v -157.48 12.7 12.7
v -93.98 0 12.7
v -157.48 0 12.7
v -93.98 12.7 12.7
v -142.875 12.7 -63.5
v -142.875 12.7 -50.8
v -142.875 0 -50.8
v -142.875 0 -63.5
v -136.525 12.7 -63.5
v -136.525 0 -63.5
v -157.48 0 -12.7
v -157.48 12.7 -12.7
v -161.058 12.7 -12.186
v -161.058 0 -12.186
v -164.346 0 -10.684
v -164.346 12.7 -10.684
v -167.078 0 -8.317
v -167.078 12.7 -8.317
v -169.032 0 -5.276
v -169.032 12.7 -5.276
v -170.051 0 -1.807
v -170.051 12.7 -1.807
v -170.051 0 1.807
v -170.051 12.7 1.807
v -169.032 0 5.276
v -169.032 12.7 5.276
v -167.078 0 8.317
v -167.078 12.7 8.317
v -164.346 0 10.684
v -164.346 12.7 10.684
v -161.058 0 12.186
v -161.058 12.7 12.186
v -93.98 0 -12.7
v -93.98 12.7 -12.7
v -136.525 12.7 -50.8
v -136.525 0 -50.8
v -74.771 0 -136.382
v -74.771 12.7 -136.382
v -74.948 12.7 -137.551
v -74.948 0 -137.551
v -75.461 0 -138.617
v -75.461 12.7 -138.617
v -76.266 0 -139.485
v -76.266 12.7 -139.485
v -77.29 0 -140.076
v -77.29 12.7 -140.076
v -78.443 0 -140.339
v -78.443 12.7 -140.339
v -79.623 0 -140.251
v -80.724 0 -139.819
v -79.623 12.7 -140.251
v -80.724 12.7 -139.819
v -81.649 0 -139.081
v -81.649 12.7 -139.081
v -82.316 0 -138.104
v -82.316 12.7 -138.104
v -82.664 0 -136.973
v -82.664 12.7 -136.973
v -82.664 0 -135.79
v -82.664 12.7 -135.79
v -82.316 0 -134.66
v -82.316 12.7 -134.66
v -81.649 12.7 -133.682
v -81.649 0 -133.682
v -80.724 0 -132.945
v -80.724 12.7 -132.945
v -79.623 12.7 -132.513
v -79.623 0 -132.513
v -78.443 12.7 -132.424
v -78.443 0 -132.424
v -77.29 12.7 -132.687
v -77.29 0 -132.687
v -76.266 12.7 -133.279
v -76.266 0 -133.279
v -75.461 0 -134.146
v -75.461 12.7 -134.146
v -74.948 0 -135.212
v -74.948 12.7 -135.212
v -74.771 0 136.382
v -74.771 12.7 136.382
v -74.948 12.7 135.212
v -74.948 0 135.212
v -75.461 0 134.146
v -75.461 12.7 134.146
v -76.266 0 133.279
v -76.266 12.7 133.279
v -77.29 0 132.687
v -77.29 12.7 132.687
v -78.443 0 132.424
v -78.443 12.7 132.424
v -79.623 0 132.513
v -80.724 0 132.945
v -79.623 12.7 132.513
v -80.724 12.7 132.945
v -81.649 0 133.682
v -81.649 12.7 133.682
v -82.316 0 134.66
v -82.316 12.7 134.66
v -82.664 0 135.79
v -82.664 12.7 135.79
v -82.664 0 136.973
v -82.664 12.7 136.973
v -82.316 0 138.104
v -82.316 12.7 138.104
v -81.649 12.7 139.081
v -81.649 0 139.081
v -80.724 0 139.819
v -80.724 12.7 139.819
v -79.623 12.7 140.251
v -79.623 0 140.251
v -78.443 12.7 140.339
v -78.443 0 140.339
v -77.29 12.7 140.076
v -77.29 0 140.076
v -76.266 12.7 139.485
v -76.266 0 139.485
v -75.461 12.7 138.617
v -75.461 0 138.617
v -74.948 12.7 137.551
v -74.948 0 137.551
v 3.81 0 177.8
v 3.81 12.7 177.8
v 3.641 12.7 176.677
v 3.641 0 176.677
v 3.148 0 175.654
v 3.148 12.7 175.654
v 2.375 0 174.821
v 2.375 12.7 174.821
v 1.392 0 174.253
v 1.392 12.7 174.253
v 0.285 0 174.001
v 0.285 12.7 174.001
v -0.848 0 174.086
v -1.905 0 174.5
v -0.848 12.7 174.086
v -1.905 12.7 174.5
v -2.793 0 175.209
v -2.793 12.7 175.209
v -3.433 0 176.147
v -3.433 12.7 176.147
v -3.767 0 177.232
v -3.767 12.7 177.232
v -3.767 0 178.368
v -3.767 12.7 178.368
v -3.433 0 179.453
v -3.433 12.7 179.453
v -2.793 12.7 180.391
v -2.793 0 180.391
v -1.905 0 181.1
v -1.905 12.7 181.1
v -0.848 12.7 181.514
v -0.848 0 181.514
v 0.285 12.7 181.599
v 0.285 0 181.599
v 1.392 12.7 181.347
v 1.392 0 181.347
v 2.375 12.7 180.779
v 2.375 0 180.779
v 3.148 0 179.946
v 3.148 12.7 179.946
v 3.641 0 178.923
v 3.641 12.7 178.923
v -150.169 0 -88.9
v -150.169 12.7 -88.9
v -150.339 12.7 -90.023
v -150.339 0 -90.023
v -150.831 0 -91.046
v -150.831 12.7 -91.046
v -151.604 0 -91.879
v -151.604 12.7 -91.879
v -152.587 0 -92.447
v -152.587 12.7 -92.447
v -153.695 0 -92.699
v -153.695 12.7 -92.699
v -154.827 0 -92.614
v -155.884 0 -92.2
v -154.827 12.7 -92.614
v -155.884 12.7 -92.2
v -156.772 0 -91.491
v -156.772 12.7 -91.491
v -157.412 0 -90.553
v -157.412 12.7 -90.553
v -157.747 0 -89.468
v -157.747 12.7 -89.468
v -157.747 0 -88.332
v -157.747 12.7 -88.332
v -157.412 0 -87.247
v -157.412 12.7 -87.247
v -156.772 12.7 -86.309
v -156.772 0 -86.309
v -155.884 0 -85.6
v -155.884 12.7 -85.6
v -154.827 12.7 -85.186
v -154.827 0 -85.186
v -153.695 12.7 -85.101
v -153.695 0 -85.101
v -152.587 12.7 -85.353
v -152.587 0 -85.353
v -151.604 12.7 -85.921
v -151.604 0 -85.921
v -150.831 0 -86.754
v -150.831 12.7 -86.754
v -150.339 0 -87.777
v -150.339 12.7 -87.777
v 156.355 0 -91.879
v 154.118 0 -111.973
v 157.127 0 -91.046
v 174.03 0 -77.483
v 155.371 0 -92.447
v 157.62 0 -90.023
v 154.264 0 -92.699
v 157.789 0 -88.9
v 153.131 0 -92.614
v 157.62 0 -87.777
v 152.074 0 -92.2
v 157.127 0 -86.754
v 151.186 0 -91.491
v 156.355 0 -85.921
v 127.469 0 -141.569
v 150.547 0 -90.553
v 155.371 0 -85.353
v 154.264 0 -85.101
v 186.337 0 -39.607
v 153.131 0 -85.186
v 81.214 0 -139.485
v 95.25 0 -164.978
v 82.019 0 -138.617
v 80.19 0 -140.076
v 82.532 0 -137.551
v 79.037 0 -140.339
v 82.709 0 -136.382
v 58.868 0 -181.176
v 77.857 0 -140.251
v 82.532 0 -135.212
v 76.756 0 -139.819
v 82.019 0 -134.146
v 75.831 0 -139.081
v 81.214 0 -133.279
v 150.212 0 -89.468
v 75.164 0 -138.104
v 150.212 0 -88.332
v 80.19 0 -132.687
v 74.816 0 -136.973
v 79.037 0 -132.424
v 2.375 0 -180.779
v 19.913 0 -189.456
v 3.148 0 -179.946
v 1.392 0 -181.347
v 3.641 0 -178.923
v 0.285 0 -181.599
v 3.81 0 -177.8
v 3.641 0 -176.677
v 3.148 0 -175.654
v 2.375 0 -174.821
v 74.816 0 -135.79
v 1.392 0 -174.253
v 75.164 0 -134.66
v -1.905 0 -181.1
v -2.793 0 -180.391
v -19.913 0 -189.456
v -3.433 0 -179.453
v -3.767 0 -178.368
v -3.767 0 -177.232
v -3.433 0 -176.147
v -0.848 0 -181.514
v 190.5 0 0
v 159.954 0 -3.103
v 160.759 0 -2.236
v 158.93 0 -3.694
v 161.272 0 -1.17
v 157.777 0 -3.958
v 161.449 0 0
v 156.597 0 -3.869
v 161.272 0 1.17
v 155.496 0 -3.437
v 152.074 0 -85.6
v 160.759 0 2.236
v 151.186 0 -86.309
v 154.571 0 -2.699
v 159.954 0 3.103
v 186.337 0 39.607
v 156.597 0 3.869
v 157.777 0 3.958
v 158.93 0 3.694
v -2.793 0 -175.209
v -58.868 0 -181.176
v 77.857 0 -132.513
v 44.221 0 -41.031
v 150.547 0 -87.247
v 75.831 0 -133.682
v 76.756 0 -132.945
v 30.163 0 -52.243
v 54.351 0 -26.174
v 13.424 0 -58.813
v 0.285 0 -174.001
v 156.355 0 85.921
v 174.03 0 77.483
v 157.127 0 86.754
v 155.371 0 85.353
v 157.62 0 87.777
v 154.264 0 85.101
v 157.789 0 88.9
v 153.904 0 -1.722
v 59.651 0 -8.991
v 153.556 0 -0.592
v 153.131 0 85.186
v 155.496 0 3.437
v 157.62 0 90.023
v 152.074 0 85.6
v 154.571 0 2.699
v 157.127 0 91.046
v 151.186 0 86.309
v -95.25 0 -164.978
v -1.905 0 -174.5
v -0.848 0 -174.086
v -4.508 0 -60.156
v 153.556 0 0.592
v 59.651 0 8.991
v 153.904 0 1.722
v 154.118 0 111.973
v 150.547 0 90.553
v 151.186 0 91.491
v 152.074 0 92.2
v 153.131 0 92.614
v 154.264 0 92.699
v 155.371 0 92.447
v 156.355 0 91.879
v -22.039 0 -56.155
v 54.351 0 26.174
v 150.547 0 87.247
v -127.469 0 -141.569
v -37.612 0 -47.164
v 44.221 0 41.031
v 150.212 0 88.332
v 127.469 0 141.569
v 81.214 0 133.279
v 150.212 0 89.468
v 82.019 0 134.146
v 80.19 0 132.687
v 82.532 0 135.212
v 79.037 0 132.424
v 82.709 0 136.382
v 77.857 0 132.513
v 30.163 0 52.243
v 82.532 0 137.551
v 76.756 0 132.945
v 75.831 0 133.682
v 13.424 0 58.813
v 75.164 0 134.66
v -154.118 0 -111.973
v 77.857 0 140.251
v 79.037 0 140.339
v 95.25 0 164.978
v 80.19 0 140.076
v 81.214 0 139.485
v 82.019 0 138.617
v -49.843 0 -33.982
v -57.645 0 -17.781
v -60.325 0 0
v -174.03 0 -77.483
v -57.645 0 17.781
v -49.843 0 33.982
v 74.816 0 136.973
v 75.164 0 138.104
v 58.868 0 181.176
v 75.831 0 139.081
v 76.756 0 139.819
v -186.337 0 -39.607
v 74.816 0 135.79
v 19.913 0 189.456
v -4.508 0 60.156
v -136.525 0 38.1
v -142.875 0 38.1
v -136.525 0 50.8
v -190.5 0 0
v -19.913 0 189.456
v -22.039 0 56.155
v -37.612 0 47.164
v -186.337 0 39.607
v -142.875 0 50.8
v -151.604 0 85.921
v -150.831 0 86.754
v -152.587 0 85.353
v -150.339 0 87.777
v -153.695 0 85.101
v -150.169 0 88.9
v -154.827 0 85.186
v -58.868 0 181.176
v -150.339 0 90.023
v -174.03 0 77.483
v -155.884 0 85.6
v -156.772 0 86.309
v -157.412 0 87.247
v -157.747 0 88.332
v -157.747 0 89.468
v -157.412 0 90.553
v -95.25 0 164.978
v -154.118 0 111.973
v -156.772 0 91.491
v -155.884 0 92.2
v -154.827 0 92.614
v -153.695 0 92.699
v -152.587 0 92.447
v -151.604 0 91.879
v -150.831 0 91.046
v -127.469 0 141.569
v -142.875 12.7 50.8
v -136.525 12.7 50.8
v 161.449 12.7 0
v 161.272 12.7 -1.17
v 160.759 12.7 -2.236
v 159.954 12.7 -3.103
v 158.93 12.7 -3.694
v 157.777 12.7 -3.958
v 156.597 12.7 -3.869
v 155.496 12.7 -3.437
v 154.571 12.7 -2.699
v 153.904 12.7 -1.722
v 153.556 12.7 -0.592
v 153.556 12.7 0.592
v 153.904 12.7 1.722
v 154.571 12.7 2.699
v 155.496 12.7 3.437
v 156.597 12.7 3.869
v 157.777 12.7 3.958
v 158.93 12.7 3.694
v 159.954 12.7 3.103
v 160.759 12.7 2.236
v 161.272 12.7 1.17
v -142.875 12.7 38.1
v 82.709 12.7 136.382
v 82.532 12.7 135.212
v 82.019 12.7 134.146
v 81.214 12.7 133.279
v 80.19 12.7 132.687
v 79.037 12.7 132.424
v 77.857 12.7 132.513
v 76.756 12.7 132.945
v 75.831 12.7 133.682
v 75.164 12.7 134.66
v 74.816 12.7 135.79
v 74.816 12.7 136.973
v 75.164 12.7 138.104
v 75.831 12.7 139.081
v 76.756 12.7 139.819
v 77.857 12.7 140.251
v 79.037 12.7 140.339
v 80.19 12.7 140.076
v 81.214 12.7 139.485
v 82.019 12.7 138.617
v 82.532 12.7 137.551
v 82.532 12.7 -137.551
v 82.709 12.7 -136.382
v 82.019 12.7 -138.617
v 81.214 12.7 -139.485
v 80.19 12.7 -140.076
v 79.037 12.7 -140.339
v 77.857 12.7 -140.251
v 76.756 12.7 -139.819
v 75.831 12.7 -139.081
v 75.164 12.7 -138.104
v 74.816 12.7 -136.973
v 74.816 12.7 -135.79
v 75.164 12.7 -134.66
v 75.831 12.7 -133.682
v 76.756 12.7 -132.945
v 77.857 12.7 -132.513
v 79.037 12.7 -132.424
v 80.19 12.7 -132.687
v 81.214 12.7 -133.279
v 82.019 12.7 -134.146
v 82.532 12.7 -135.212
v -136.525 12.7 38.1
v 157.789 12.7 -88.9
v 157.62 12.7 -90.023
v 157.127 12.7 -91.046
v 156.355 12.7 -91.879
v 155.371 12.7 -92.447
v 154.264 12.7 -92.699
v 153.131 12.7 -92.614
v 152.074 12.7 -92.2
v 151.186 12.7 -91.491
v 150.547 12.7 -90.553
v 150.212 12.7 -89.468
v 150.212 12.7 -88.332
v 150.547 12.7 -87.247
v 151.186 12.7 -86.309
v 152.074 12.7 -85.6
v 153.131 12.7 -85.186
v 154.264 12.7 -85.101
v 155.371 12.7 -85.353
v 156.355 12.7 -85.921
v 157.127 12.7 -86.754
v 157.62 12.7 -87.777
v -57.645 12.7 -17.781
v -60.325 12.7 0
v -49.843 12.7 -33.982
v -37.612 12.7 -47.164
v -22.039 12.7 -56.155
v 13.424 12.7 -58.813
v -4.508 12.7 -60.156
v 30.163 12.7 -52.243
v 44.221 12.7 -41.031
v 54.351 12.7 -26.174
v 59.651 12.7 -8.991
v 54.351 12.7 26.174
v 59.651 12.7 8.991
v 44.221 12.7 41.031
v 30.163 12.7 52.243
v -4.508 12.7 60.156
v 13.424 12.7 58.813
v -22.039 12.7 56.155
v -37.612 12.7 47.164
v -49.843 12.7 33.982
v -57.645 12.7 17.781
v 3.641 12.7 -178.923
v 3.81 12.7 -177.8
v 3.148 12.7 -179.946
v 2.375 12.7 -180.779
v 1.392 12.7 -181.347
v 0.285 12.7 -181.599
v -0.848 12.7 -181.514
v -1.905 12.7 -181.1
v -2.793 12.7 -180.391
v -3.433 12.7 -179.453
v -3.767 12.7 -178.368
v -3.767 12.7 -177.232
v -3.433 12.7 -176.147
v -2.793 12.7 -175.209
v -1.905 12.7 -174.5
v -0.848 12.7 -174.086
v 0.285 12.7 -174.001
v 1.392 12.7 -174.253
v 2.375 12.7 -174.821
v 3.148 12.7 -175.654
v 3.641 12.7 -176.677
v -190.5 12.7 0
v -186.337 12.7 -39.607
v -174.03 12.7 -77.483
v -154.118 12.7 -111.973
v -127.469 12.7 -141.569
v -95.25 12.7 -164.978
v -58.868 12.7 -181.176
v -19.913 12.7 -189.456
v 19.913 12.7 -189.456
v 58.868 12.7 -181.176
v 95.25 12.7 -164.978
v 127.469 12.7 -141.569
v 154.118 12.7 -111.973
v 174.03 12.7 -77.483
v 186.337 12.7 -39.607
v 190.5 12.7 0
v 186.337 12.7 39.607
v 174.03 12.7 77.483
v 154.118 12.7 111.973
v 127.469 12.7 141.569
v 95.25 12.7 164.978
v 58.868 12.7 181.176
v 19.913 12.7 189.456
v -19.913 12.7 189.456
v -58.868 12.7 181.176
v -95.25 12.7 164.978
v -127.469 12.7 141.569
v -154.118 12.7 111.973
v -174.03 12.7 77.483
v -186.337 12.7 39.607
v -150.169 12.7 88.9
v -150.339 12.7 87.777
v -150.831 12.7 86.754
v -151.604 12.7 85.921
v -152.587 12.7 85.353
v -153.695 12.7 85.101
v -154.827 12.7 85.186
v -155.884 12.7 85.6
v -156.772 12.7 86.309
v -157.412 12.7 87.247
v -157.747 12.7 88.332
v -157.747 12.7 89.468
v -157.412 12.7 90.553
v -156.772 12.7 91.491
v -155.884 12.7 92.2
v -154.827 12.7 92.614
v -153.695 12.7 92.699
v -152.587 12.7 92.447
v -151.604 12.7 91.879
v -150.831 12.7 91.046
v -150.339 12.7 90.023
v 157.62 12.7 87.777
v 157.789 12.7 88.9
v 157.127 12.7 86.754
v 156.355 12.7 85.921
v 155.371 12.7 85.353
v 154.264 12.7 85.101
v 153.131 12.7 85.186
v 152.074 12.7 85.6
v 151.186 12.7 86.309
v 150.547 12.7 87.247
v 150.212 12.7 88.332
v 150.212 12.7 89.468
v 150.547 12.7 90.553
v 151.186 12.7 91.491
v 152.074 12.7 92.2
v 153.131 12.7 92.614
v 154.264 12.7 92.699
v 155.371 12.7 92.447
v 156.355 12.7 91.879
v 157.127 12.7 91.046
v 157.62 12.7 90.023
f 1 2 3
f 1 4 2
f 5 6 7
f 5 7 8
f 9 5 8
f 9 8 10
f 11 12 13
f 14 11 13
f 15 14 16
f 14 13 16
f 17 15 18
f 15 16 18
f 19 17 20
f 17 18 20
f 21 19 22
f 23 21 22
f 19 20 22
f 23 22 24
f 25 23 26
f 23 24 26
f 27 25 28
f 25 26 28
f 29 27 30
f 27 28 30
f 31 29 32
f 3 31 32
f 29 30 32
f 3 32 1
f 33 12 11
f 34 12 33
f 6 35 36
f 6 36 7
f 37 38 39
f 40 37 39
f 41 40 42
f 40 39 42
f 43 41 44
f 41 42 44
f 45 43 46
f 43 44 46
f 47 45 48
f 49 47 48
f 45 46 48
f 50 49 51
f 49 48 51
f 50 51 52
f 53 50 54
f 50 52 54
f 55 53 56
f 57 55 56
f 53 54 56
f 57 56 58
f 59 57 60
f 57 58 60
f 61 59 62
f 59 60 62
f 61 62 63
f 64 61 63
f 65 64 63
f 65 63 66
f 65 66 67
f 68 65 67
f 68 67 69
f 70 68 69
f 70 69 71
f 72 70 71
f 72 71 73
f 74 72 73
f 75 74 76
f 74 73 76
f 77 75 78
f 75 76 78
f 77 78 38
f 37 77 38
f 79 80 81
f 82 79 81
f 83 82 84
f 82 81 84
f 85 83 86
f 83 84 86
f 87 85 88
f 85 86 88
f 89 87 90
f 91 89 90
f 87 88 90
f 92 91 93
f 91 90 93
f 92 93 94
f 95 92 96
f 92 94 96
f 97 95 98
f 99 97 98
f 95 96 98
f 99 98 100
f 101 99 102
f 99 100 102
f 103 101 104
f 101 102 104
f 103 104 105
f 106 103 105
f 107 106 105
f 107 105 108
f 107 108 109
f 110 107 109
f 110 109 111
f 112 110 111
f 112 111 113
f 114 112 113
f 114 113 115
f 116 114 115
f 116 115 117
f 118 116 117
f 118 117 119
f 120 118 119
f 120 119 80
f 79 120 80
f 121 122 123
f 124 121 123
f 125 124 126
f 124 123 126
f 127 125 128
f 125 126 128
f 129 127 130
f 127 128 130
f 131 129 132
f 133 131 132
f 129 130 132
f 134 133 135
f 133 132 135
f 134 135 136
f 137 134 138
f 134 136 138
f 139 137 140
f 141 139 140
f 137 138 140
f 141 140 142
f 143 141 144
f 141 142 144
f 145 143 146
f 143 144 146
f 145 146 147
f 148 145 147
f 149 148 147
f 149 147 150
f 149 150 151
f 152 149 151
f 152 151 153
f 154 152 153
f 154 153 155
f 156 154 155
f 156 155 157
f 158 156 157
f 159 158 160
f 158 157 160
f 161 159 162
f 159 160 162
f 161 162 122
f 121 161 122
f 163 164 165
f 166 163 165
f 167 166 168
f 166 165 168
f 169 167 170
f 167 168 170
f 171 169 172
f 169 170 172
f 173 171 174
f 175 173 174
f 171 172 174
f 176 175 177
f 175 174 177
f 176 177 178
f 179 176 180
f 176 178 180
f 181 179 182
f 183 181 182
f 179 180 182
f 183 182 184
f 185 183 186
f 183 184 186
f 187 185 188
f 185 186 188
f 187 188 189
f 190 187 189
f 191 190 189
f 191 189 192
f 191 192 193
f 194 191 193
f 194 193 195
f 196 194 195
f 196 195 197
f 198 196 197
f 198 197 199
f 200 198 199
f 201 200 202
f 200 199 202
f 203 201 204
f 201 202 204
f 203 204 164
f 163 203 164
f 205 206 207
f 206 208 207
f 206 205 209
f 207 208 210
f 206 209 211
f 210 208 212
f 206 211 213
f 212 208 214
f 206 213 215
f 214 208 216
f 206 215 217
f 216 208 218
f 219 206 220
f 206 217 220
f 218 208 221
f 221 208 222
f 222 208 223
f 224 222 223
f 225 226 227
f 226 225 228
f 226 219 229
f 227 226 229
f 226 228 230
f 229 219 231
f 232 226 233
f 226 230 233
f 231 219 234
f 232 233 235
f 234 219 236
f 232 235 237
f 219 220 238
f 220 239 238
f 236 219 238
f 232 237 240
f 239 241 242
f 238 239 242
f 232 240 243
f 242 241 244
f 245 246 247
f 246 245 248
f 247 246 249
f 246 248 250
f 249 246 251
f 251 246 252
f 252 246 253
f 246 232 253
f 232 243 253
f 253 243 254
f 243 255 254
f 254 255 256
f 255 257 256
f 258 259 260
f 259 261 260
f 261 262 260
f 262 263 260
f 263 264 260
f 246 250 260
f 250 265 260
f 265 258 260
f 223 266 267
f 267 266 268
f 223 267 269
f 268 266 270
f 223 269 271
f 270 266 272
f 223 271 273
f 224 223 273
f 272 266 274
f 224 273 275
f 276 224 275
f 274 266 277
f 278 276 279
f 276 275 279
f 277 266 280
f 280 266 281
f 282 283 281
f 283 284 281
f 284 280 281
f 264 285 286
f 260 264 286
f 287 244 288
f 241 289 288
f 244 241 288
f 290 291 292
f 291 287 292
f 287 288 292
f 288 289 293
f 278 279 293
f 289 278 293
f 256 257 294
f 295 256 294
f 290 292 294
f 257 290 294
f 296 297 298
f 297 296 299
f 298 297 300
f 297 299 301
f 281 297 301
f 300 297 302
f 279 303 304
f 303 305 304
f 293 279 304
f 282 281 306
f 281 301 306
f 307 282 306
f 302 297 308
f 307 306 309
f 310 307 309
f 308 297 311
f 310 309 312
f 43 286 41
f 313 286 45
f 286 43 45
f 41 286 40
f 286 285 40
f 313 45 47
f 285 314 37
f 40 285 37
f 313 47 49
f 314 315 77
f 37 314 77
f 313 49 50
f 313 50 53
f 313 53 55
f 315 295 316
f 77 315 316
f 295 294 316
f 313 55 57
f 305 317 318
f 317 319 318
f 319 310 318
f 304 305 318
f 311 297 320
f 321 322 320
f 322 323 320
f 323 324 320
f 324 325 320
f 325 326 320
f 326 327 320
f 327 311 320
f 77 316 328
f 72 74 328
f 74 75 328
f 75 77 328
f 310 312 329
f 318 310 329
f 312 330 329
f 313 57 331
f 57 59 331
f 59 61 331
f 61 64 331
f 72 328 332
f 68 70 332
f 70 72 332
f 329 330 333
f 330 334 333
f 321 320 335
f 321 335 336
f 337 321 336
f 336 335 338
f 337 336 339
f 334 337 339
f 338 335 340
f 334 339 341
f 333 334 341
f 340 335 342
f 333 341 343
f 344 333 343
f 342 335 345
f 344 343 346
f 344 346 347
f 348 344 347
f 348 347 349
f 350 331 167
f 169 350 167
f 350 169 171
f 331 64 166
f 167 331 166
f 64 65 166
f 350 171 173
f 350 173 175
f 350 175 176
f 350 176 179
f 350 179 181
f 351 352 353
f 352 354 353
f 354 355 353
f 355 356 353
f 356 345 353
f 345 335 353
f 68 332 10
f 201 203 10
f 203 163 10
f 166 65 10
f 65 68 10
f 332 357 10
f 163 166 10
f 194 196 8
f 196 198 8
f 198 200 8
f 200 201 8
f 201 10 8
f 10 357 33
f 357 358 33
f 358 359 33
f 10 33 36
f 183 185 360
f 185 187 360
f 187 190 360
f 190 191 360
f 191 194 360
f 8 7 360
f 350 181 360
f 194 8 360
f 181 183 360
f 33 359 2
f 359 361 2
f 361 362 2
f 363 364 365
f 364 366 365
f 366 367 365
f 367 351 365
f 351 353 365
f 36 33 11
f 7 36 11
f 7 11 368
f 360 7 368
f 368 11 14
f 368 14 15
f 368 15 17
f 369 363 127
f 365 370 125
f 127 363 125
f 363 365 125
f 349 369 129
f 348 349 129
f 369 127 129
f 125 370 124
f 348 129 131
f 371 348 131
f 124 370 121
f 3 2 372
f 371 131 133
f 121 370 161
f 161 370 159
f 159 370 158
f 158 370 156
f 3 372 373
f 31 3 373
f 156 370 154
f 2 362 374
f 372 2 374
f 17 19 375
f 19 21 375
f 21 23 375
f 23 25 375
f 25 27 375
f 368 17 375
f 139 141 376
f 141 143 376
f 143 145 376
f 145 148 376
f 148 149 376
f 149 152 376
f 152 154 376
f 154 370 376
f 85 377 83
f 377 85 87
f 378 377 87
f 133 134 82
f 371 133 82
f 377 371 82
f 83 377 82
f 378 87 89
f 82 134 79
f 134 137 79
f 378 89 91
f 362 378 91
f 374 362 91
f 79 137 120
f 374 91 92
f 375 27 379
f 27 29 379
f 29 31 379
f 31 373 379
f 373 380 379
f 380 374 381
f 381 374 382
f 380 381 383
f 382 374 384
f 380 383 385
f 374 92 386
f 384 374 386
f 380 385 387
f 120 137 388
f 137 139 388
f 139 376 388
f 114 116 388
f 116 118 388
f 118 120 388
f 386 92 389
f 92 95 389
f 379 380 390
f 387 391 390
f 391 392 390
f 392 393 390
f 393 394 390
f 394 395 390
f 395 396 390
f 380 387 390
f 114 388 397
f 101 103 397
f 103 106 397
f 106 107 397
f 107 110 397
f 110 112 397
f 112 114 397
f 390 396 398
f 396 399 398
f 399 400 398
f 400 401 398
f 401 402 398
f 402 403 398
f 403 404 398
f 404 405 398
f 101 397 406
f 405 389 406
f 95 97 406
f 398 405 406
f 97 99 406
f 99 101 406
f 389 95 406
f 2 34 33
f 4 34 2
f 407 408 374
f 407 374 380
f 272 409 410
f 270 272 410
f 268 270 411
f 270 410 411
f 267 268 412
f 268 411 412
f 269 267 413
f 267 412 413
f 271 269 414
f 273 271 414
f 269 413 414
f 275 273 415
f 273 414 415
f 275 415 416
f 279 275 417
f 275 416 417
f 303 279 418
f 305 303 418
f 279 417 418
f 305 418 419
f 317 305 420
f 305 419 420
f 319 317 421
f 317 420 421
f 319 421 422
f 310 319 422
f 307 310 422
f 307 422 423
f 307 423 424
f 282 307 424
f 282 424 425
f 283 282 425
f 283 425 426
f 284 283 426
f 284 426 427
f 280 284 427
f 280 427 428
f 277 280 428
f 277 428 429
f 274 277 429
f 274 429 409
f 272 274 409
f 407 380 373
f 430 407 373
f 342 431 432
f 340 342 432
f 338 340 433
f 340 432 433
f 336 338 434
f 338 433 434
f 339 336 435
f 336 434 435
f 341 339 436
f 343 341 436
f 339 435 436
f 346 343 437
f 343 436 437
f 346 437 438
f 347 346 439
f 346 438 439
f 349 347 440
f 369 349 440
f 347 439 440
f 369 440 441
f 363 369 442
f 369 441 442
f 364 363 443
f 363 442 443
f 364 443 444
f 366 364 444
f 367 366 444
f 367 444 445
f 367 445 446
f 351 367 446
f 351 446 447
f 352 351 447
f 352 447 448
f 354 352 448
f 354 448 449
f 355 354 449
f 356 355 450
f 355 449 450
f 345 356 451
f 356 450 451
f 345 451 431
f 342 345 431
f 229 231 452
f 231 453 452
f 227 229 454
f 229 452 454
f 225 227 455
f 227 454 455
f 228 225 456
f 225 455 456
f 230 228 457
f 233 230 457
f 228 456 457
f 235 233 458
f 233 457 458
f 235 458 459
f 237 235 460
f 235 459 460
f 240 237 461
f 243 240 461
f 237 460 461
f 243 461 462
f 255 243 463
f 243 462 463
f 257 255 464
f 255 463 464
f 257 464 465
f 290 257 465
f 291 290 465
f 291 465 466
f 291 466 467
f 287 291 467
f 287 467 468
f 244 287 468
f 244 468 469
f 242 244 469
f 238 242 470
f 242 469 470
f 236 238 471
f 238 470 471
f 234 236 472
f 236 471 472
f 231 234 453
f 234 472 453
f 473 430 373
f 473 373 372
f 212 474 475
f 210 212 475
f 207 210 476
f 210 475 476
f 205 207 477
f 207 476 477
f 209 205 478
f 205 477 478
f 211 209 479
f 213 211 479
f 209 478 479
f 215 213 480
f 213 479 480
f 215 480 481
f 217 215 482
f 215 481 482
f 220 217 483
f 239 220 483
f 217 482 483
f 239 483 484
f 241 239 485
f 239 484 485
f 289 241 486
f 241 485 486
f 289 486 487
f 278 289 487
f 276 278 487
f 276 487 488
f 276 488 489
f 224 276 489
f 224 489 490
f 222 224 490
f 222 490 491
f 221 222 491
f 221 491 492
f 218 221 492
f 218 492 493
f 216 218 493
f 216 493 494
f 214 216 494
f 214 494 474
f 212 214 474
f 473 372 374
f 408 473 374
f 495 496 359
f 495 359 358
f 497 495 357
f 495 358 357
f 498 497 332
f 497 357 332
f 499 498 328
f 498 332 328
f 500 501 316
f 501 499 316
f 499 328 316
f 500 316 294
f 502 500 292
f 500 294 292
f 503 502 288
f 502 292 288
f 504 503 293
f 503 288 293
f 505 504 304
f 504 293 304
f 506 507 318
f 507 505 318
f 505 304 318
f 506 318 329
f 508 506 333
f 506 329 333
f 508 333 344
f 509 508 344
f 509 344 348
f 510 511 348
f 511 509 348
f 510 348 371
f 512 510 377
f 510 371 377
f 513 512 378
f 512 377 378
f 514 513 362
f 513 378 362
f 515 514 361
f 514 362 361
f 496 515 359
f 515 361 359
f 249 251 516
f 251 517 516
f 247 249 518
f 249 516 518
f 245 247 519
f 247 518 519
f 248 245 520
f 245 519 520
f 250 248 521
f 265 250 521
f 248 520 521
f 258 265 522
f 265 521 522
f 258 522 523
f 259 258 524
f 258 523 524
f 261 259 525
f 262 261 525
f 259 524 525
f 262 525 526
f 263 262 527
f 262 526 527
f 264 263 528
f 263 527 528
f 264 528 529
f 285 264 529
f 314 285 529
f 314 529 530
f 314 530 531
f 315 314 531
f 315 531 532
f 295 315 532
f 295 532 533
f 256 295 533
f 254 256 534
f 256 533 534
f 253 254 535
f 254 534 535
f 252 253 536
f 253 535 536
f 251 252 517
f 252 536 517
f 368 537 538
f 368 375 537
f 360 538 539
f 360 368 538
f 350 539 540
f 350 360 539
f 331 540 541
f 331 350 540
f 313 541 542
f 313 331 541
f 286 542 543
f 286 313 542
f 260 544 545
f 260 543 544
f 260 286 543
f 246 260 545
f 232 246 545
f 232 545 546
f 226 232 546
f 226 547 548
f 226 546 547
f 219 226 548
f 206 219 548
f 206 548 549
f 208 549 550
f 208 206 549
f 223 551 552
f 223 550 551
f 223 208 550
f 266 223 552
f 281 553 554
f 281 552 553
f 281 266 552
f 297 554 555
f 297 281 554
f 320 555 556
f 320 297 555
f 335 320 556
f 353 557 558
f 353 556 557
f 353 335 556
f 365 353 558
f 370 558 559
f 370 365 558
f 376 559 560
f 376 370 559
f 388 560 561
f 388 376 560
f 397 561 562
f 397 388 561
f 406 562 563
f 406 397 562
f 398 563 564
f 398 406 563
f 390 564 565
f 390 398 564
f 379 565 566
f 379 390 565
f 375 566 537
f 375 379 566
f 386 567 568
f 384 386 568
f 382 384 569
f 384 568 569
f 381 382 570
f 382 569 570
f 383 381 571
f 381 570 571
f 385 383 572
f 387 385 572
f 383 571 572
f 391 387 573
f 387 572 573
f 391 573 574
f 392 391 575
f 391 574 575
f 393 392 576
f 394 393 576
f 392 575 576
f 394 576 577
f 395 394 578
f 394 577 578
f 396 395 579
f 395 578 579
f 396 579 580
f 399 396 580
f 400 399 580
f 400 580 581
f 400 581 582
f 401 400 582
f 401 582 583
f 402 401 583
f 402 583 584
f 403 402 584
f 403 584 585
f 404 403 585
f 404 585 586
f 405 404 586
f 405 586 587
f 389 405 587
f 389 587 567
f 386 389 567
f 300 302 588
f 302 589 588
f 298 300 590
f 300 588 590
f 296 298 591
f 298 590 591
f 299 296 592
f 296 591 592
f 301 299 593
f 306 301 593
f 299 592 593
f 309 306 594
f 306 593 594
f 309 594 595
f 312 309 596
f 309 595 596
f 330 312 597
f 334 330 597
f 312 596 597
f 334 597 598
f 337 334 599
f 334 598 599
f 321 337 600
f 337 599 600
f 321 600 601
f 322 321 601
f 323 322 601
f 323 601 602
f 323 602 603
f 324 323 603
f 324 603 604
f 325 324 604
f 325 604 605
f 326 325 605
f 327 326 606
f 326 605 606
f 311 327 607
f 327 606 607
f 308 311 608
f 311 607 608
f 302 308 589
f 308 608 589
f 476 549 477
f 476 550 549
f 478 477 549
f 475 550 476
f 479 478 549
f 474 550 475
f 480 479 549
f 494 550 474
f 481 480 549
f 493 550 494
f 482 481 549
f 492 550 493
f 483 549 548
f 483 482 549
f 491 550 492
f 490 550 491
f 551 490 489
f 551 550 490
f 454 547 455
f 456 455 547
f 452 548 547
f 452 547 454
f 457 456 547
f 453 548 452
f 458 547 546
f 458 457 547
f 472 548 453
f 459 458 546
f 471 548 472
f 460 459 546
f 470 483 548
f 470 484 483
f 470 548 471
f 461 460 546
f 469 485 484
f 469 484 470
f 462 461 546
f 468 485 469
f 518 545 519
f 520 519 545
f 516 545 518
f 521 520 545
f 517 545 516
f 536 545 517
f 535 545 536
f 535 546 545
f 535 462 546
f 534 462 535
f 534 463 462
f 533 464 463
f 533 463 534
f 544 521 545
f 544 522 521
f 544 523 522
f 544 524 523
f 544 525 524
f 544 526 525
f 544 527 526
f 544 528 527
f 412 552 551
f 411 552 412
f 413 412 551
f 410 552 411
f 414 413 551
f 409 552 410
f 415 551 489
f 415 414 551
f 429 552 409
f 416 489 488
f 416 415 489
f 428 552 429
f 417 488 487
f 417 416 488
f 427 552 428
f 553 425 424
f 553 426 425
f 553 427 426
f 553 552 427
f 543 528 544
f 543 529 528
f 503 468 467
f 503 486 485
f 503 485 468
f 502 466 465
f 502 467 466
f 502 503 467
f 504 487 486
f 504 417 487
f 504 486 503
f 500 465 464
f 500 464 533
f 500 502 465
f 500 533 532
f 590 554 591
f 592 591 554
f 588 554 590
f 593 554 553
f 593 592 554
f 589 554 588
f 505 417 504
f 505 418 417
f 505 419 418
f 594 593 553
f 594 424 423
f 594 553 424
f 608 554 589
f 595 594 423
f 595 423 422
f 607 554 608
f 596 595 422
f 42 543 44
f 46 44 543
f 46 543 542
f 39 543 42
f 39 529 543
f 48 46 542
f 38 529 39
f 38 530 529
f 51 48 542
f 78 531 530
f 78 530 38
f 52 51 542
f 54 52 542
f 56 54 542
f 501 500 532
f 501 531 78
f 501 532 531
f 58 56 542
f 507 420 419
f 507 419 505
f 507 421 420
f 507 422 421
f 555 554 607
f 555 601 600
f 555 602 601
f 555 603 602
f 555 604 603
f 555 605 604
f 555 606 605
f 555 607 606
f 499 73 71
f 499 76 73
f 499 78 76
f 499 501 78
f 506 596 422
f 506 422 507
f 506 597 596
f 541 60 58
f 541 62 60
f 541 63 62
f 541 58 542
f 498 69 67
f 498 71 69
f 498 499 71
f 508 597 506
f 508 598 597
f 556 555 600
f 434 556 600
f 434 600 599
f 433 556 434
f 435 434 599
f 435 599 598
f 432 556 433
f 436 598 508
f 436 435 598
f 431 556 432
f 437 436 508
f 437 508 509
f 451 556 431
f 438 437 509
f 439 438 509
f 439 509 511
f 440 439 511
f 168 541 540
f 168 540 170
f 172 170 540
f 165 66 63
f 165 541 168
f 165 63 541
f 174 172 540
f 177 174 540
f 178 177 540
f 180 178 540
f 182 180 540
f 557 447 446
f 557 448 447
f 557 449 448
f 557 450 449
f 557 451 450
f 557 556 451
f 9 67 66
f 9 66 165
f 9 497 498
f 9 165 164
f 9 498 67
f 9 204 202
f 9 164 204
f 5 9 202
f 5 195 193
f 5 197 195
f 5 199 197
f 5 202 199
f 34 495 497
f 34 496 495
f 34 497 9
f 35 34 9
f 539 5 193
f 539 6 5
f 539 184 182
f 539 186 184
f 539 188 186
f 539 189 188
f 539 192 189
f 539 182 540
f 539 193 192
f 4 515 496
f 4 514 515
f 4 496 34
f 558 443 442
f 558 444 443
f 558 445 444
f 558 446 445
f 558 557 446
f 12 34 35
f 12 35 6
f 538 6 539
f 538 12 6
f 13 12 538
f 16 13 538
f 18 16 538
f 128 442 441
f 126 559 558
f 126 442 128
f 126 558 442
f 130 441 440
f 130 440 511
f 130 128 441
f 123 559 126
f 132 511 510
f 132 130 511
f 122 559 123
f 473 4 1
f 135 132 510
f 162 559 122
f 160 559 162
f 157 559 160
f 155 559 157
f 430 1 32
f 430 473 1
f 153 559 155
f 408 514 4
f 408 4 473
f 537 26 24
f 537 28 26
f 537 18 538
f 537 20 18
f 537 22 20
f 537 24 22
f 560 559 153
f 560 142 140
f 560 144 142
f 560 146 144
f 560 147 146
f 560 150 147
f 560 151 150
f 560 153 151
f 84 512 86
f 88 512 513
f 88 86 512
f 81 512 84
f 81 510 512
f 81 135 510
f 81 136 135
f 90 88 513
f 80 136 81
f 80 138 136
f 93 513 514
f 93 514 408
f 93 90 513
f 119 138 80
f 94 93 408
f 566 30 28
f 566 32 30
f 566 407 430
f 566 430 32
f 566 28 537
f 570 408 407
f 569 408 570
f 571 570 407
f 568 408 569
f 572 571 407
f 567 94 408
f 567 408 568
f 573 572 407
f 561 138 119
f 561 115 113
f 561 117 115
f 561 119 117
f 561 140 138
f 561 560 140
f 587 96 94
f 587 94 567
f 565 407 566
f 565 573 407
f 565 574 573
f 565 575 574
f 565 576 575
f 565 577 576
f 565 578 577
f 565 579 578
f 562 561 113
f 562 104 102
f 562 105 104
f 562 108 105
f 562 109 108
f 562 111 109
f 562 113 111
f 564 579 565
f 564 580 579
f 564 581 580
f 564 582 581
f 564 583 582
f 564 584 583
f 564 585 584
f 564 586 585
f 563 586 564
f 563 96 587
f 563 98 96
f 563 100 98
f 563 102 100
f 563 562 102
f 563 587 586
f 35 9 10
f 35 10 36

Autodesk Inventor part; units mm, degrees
ref_plane "YZ Plane" through (0, 0, 0) normal (1, 0, 0) x (0, 1, 0)
ref_plane "XZ Plane" through (0, 0, 0) normal (0, 1, 0) x (-1, 0, 0)
ref_plane "XY Plane" through (0, 0, 0) normal (0, 0, 1) x (1, 0, 0)
sketch "Sketch1" plane through (0, 0, 0) normal (0, 1, 0) x (-1, 0, 0)
  circle A0 centre (0, 0) radius 190.5
  circle A1 centre (0, 0) radius 60.325
  dimension "d0" = 381
  dimension "d1" = 120.65
extrude "Extrusion1" add sketch "Sketch1" along normal blind 12.7
sketch "Sketch2" plane through (0, 12.7, 0) normal (0, 1, 0) x (1, 0, 0)
  line L0 (-142.875, 63.5) -> (-136.525, 63.5)
  line L1 (-136.525, 63.5) -> (-136.525, 50.8)
  line L2 (-136.525, 50.8) -> (-142.875, 50.8)
  line L3 (-142.875, 50.8) -> (-142.875, 63.5)
  line L4 (-136.525, 50.8) -> (-136.525, -50.8) construction
  line L5 (-111.125, 50.8) -> (-212.725, 50.8) construction
  line L6 (-136.525, -50.8) -> (-142.875, -50.8)
  line L7 (-142.875, -50.8) -> (-142.875, -38.1)
  line L8 (-142.875, -38.1) -> (-136.525, -38.1)
  line L9 (-136.525, -38.1) -> (-136.525, -50.8)
  line L10 (-136.525, 0) -> (-60.325, 0) construction
  line L11 (-136.525, 0) -> (-60.325, 0) construction
  circle A0 centre (0, 0) radius 85.725 construction
  line L12 (0, 0) -> (-85.725, 0) construction
  dimension "d4" = 6.35
  dimension "d5" = 12.7
  dimension "d6" = 101.6
  dimension "d7" = 90
  dimension "d8" = 6.35
  dimension "d9" = 12.7
  dimension "d10" = 76.2
  dimension "d11" = 0
extrude "Extrusion2" cut sketch "Sketch2" against normal through all
sketch "Sketch3" plane through (0, 12.7, 0) normal (0, 1, 0) x (1, 0, 0)
  circle A0 centre (0, 0) radius 157.48 construction
  circle A1 centre (-157.48, 0) radius 3.9687
  circle A2 centre (-78.74, -136.3817) radius 3.9687
  circle A3 centre (78.74, -136.3817) radius 3.9687
  circle A4 centre (157.48, 0) radius 3.9687
  circle A5 centre (78.74, 136.3817) radius 3.9687
  circle A6 centre (-78.74, 136.3817) radius 3.9687
  dimension "d16" = 314.96
  dimension "d17" = 7.9375
  dimension "d18" = 360
extrude "Extrusion3" cut sketch "Sketch3" against normal through all
sketch "Sketch4" plane through (0, 12.7, 0) normal (0, 1, 0) x (1, 0, 0)
  line L0 (0, 0) -> (0, -177.8) construction
  line L1 (0, 0) -> (177.8, 0) construction
  circle A0 centre (0, -177.8) radius 3.81
  circle A1 centre (153.9793, -88.9) radius 3.81
  circle A2 centre (153.9793, 88.9) radius 3.81
  circle A3 centre (0, 177.8) radius 3.81
  circle A4 centre (-153.9793, 88.9) radius 3.81
  circle A5 centre (-153.9793, -88.9) radius 3.81
  dimension "d21" = 177.8
  dimension "d22" = 90
  dimension "d23" = 7.62
  dimension "d26" = 360
extrude "Extrusion4" cut sketch "Sketch4" against normal through all
sketch "Sketch5" plane through (0, 12.7, 0) normal (0, 1, 0) x (1, 0, 0)
  circle A0 centre (-157.48, 0) radius 3.9687 projected
  circle A1 centre (-157.48, 0) radius 12.7
  point P0 (0, 0)
  dimension "d30" = 25.4
extrude "Extrusion5" cut sketch "Sketch5" against normal through all
sketch "Sketch6" plane through (0, 12.7, 0) normal (0, 1, 0) x (1, 0, 0)
  circle A0 centre (-157.48, 0) radius 12.7 projected
  line L0 (-157.48, 12.7) -> (-93.98, 12.7)
  line L1 (-93.98, 12.7) -> (-93.98, -12.7)
  line L2 (-93.98, -12.7) -> (-157.48, -12.7)
  line L3 (-157.48, -12.7) -> (-157.48, 12.7)
  point P0 (0, 0)
  dimension "d33" = 63.5
extrude "Extrusion6" cut sketch "Sketch6" against normal through all contours A0 L3 | A0 L0 L1 L2 picked at (-153.2467, 0)
equation "\"d4\" = d8"
properties part number "Turntable Mid" material "PVC-Piping"
